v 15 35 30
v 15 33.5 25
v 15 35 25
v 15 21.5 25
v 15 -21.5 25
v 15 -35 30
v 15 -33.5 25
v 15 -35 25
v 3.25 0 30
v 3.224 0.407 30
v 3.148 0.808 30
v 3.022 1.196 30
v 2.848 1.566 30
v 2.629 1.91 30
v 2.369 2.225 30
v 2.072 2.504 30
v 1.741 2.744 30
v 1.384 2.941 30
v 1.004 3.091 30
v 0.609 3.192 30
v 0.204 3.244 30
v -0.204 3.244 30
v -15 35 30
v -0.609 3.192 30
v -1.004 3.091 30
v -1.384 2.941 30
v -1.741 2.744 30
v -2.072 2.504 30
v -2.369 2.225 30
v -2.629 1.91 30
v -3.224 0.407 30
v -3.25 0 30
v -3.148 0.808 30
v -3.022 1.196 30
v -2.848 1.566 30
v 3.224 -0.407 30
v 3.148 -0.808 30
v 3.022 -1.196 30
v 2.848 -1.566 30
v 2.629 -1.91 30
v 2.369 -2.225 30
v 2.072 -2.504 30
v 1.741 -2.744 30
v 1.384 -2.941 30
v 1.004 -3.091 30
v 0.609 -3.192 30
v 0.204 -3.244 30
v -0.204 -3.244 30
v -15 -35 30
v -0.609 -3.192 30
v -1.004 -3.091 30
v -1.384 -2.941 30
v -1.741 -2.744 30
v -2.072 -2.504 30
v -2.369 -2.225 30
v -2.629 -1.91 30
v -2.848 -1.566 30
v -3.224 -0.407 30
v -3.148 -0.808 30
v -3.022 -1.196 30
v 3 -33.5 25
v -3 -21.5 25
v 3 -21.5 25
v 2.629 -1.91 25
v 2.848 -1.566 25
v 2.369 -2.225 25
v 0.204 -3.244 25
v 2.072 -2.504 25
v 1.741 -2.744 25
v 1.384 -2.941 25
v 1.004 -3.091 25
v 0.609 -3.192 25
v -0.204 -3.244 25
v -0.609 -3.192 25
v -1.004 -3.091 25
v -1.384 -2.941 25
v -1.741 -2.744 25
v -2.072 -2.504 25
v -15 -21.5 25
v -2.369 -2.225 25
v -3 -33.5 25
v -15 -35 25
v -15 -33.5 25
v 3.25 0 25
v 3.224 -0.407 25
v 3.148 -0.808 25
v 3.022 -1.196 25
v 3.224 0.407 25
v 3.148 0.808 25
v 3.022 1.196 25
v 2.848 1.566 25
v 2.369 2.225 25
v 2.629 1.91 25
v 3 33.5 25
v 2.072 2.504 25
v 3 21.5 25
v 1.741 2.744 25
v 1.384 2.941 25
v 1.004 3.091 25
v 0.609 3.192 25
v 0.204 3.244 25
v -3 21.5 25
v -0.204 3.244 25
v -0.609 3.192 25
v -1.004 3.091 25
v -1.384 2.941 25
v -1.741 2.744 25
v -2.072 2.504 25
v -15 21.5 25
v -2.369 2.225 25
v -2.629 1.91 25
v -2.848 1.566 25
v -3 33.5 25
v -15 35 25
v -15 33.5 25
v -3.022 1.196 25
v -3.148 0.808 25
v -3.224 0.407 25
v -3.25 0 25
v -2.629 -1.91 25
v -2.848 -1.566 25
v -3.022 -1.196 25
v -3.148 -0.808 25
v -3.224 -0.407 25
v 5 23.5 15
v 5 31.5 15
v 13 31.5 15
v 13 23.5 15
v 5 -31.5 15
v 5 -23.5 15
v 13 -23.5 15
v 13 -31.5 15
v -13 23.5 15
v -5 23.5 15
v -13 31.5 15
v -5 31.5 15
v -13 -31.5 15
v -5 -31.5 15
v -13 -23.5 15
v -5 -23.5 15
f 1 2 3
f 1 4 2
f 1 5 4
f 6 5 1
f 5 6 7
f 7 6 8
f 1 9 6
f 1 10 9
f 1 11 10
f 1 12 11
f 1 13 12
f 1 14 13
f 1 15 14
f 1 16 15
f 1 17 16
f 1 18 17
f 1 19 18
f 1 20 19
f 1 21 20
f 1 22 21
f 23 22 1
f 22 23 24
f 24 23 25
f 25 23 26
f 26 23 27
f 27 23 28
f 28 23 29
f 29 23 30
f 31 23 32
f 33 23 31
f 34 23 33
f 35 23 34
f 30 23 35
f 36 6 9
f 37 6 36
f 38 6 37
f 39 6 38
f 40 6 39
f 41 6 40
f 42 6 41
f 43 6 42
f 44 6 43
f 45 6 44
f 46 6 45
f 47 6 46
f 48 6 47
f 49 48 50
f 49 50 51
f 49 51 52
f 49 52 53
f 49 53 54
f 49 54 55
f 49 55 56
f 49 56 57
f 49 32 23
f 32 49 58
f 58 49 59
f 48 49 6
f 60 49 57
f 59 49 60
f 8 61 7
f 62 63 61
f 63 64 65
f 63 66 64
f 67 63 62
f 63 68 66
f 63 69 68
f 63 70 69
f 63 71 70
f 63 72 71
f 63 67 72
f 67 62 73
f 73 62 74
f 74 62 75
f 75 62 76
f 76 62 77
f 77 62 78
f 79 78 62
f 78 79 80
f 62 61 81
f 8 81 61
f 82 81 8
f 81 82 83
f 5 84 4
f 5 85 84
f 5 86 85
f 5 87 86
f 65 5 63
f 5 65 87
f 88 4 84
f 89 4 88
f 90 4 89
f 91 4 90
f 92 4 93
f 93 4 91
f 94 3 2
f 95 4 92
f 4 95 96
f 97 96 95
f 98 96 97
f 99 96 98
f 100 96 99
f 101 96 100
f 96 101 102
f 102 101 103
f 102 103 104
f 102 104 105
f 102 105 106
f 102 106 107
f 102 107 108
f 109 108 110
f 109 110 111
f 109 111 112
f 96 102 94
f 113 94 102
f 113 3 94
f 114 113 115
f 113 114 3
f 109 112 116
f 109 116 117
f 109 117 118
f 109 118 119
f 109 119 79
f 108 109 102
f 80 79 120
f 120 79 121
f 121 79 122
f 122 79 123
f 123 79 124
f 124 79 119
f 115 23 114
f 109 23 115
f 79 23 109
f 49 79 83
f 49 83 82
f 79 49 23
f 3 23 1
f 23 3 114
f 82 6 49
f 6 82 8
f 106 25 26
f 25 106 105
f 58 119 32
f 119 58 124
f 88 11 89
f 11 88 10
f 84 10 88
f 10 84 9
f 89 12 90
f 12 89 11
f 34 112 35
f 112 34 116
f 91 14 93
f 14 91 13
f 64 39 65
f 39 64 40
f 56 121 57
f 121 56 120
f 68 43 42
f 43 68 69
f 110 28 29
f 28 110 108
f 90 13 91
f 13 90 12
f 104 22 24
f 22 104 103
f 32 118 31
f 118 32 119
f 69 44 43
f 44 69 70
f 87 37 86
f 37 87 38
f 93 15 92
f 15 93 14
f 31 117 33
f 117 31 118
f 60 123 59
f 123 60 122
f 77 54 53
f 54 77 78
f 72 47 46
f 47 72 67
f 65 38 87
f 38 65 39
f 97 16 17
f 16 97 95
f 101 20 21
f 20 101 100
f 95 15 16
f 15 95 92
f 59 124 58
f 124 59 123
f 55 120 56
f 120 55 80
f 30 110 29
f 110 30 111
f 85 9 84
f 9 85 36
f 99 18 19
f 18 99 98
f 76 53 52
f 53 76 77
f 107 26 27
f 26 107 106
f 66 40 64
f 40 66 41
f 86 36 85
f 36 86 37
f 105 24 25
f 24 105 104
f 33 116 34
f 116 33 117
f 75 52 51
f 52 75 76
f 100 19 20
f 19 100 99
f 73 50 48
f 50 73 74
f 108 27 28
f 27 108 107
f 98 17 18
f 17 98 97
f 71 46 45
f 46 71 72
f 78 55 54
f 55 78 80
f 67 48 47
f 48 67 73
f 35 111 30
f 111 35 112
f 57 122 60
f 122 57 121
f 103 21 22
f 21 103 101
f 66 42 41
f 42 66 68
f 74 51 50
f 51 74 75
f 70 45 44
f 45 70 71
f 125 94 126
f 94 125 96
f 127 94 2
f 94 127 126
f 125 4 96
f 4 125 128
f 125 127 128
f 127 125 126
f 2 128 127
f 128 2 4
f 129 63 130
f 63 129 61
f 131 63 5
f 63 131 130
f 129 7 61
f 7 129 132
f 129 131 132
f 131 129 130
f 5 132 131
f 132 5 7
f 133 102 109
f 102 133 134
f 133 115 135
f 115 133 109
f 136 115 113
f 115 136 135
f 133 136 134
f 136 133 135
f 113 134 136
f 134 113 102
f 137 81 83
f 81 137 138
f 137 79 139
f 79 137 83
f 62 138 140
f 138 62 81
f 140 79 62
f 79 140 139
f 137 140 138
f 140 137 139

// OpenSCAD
$fn=50;
bottom_pillar_width=8;
top_pillar_width=12;
pillar_height=10;

pillar_sep_x=18;
pillar_sep_y=55;
pillar_pos_height=15;

cavity_diameter=40;

holder_size_x=30;
holder_size_y=70;

holder_size_x_bottom=70;

holder_height=25;

hole_diam=6.5;
top_thickness=5;

module pillar(tolerance =0){
    hull(){
        translate([-bottom_pillar_width/2-tolerance/2,-bottom_pillar_width/2-tolerance/2,0])cube([bottom_pillar_width+tolerance,bottom_pillar_width+tolerance,0.0001]);
        translate([-top_pillar_width/2-tolerance/2,-top_pillar_width/2-tolerance/2,pillar_height])cube([top_pillar_width+tolerance,top_pillar_width+tolerance,0.0001]);
    }
};


module suck(){
    difference(){
translate([-holder_size_x/2,-holder_size_y/2,holder_height])cube([holder_size_x,holder_size_y,top_thickness]);  
       cylinder(r=hole_diam/2,h=100); 
    } 
translate([pillar_sep_x/2,pillar_sep_y/2,pillar_pos_height]) pillar();
    translate([pillar_sep_x/2,-pillar_sep_y/2,pillar_pos_height]) pillar();
    translate([-pillar_sep_x/2,pillar_sep_y/2,pillar_pos_height]) pillar();
    translate([-pillar_sep_x/2,-pillar_sep_y/2,pillar_pos_height]) pillar();
    
}
suck();

module holder(){
    difference(){
    translate([-holder_size_x_bottom/2,-holder_size_y/2,0])cube([holder_size_x_bottom,holder_size_y,holder_height]);
        cylinder(r=cavity_diameter/2,h=100);
         translate([pillar_sep_x/2,pillar_sep_y/2,pillar_pos_height]) #pillar(tolerance=0.3);
        translate([-pillar_sep_x/2,pillar_sep_y/2,pillar_pos_height]) #pillar(tolerance=0.3);
        translate([-pillar_sep_x/2,-pillar_sep_y/2,pillar_pos_height]) #pillar(tolerance=0.3);
        translate([pillar_sep_x/2,-pillar_sep_y/2,pillar_pos_height]) #pillar(tolerance=0.3);
    }
}
    
   
    
//translate([0,0,-10])  holder();
